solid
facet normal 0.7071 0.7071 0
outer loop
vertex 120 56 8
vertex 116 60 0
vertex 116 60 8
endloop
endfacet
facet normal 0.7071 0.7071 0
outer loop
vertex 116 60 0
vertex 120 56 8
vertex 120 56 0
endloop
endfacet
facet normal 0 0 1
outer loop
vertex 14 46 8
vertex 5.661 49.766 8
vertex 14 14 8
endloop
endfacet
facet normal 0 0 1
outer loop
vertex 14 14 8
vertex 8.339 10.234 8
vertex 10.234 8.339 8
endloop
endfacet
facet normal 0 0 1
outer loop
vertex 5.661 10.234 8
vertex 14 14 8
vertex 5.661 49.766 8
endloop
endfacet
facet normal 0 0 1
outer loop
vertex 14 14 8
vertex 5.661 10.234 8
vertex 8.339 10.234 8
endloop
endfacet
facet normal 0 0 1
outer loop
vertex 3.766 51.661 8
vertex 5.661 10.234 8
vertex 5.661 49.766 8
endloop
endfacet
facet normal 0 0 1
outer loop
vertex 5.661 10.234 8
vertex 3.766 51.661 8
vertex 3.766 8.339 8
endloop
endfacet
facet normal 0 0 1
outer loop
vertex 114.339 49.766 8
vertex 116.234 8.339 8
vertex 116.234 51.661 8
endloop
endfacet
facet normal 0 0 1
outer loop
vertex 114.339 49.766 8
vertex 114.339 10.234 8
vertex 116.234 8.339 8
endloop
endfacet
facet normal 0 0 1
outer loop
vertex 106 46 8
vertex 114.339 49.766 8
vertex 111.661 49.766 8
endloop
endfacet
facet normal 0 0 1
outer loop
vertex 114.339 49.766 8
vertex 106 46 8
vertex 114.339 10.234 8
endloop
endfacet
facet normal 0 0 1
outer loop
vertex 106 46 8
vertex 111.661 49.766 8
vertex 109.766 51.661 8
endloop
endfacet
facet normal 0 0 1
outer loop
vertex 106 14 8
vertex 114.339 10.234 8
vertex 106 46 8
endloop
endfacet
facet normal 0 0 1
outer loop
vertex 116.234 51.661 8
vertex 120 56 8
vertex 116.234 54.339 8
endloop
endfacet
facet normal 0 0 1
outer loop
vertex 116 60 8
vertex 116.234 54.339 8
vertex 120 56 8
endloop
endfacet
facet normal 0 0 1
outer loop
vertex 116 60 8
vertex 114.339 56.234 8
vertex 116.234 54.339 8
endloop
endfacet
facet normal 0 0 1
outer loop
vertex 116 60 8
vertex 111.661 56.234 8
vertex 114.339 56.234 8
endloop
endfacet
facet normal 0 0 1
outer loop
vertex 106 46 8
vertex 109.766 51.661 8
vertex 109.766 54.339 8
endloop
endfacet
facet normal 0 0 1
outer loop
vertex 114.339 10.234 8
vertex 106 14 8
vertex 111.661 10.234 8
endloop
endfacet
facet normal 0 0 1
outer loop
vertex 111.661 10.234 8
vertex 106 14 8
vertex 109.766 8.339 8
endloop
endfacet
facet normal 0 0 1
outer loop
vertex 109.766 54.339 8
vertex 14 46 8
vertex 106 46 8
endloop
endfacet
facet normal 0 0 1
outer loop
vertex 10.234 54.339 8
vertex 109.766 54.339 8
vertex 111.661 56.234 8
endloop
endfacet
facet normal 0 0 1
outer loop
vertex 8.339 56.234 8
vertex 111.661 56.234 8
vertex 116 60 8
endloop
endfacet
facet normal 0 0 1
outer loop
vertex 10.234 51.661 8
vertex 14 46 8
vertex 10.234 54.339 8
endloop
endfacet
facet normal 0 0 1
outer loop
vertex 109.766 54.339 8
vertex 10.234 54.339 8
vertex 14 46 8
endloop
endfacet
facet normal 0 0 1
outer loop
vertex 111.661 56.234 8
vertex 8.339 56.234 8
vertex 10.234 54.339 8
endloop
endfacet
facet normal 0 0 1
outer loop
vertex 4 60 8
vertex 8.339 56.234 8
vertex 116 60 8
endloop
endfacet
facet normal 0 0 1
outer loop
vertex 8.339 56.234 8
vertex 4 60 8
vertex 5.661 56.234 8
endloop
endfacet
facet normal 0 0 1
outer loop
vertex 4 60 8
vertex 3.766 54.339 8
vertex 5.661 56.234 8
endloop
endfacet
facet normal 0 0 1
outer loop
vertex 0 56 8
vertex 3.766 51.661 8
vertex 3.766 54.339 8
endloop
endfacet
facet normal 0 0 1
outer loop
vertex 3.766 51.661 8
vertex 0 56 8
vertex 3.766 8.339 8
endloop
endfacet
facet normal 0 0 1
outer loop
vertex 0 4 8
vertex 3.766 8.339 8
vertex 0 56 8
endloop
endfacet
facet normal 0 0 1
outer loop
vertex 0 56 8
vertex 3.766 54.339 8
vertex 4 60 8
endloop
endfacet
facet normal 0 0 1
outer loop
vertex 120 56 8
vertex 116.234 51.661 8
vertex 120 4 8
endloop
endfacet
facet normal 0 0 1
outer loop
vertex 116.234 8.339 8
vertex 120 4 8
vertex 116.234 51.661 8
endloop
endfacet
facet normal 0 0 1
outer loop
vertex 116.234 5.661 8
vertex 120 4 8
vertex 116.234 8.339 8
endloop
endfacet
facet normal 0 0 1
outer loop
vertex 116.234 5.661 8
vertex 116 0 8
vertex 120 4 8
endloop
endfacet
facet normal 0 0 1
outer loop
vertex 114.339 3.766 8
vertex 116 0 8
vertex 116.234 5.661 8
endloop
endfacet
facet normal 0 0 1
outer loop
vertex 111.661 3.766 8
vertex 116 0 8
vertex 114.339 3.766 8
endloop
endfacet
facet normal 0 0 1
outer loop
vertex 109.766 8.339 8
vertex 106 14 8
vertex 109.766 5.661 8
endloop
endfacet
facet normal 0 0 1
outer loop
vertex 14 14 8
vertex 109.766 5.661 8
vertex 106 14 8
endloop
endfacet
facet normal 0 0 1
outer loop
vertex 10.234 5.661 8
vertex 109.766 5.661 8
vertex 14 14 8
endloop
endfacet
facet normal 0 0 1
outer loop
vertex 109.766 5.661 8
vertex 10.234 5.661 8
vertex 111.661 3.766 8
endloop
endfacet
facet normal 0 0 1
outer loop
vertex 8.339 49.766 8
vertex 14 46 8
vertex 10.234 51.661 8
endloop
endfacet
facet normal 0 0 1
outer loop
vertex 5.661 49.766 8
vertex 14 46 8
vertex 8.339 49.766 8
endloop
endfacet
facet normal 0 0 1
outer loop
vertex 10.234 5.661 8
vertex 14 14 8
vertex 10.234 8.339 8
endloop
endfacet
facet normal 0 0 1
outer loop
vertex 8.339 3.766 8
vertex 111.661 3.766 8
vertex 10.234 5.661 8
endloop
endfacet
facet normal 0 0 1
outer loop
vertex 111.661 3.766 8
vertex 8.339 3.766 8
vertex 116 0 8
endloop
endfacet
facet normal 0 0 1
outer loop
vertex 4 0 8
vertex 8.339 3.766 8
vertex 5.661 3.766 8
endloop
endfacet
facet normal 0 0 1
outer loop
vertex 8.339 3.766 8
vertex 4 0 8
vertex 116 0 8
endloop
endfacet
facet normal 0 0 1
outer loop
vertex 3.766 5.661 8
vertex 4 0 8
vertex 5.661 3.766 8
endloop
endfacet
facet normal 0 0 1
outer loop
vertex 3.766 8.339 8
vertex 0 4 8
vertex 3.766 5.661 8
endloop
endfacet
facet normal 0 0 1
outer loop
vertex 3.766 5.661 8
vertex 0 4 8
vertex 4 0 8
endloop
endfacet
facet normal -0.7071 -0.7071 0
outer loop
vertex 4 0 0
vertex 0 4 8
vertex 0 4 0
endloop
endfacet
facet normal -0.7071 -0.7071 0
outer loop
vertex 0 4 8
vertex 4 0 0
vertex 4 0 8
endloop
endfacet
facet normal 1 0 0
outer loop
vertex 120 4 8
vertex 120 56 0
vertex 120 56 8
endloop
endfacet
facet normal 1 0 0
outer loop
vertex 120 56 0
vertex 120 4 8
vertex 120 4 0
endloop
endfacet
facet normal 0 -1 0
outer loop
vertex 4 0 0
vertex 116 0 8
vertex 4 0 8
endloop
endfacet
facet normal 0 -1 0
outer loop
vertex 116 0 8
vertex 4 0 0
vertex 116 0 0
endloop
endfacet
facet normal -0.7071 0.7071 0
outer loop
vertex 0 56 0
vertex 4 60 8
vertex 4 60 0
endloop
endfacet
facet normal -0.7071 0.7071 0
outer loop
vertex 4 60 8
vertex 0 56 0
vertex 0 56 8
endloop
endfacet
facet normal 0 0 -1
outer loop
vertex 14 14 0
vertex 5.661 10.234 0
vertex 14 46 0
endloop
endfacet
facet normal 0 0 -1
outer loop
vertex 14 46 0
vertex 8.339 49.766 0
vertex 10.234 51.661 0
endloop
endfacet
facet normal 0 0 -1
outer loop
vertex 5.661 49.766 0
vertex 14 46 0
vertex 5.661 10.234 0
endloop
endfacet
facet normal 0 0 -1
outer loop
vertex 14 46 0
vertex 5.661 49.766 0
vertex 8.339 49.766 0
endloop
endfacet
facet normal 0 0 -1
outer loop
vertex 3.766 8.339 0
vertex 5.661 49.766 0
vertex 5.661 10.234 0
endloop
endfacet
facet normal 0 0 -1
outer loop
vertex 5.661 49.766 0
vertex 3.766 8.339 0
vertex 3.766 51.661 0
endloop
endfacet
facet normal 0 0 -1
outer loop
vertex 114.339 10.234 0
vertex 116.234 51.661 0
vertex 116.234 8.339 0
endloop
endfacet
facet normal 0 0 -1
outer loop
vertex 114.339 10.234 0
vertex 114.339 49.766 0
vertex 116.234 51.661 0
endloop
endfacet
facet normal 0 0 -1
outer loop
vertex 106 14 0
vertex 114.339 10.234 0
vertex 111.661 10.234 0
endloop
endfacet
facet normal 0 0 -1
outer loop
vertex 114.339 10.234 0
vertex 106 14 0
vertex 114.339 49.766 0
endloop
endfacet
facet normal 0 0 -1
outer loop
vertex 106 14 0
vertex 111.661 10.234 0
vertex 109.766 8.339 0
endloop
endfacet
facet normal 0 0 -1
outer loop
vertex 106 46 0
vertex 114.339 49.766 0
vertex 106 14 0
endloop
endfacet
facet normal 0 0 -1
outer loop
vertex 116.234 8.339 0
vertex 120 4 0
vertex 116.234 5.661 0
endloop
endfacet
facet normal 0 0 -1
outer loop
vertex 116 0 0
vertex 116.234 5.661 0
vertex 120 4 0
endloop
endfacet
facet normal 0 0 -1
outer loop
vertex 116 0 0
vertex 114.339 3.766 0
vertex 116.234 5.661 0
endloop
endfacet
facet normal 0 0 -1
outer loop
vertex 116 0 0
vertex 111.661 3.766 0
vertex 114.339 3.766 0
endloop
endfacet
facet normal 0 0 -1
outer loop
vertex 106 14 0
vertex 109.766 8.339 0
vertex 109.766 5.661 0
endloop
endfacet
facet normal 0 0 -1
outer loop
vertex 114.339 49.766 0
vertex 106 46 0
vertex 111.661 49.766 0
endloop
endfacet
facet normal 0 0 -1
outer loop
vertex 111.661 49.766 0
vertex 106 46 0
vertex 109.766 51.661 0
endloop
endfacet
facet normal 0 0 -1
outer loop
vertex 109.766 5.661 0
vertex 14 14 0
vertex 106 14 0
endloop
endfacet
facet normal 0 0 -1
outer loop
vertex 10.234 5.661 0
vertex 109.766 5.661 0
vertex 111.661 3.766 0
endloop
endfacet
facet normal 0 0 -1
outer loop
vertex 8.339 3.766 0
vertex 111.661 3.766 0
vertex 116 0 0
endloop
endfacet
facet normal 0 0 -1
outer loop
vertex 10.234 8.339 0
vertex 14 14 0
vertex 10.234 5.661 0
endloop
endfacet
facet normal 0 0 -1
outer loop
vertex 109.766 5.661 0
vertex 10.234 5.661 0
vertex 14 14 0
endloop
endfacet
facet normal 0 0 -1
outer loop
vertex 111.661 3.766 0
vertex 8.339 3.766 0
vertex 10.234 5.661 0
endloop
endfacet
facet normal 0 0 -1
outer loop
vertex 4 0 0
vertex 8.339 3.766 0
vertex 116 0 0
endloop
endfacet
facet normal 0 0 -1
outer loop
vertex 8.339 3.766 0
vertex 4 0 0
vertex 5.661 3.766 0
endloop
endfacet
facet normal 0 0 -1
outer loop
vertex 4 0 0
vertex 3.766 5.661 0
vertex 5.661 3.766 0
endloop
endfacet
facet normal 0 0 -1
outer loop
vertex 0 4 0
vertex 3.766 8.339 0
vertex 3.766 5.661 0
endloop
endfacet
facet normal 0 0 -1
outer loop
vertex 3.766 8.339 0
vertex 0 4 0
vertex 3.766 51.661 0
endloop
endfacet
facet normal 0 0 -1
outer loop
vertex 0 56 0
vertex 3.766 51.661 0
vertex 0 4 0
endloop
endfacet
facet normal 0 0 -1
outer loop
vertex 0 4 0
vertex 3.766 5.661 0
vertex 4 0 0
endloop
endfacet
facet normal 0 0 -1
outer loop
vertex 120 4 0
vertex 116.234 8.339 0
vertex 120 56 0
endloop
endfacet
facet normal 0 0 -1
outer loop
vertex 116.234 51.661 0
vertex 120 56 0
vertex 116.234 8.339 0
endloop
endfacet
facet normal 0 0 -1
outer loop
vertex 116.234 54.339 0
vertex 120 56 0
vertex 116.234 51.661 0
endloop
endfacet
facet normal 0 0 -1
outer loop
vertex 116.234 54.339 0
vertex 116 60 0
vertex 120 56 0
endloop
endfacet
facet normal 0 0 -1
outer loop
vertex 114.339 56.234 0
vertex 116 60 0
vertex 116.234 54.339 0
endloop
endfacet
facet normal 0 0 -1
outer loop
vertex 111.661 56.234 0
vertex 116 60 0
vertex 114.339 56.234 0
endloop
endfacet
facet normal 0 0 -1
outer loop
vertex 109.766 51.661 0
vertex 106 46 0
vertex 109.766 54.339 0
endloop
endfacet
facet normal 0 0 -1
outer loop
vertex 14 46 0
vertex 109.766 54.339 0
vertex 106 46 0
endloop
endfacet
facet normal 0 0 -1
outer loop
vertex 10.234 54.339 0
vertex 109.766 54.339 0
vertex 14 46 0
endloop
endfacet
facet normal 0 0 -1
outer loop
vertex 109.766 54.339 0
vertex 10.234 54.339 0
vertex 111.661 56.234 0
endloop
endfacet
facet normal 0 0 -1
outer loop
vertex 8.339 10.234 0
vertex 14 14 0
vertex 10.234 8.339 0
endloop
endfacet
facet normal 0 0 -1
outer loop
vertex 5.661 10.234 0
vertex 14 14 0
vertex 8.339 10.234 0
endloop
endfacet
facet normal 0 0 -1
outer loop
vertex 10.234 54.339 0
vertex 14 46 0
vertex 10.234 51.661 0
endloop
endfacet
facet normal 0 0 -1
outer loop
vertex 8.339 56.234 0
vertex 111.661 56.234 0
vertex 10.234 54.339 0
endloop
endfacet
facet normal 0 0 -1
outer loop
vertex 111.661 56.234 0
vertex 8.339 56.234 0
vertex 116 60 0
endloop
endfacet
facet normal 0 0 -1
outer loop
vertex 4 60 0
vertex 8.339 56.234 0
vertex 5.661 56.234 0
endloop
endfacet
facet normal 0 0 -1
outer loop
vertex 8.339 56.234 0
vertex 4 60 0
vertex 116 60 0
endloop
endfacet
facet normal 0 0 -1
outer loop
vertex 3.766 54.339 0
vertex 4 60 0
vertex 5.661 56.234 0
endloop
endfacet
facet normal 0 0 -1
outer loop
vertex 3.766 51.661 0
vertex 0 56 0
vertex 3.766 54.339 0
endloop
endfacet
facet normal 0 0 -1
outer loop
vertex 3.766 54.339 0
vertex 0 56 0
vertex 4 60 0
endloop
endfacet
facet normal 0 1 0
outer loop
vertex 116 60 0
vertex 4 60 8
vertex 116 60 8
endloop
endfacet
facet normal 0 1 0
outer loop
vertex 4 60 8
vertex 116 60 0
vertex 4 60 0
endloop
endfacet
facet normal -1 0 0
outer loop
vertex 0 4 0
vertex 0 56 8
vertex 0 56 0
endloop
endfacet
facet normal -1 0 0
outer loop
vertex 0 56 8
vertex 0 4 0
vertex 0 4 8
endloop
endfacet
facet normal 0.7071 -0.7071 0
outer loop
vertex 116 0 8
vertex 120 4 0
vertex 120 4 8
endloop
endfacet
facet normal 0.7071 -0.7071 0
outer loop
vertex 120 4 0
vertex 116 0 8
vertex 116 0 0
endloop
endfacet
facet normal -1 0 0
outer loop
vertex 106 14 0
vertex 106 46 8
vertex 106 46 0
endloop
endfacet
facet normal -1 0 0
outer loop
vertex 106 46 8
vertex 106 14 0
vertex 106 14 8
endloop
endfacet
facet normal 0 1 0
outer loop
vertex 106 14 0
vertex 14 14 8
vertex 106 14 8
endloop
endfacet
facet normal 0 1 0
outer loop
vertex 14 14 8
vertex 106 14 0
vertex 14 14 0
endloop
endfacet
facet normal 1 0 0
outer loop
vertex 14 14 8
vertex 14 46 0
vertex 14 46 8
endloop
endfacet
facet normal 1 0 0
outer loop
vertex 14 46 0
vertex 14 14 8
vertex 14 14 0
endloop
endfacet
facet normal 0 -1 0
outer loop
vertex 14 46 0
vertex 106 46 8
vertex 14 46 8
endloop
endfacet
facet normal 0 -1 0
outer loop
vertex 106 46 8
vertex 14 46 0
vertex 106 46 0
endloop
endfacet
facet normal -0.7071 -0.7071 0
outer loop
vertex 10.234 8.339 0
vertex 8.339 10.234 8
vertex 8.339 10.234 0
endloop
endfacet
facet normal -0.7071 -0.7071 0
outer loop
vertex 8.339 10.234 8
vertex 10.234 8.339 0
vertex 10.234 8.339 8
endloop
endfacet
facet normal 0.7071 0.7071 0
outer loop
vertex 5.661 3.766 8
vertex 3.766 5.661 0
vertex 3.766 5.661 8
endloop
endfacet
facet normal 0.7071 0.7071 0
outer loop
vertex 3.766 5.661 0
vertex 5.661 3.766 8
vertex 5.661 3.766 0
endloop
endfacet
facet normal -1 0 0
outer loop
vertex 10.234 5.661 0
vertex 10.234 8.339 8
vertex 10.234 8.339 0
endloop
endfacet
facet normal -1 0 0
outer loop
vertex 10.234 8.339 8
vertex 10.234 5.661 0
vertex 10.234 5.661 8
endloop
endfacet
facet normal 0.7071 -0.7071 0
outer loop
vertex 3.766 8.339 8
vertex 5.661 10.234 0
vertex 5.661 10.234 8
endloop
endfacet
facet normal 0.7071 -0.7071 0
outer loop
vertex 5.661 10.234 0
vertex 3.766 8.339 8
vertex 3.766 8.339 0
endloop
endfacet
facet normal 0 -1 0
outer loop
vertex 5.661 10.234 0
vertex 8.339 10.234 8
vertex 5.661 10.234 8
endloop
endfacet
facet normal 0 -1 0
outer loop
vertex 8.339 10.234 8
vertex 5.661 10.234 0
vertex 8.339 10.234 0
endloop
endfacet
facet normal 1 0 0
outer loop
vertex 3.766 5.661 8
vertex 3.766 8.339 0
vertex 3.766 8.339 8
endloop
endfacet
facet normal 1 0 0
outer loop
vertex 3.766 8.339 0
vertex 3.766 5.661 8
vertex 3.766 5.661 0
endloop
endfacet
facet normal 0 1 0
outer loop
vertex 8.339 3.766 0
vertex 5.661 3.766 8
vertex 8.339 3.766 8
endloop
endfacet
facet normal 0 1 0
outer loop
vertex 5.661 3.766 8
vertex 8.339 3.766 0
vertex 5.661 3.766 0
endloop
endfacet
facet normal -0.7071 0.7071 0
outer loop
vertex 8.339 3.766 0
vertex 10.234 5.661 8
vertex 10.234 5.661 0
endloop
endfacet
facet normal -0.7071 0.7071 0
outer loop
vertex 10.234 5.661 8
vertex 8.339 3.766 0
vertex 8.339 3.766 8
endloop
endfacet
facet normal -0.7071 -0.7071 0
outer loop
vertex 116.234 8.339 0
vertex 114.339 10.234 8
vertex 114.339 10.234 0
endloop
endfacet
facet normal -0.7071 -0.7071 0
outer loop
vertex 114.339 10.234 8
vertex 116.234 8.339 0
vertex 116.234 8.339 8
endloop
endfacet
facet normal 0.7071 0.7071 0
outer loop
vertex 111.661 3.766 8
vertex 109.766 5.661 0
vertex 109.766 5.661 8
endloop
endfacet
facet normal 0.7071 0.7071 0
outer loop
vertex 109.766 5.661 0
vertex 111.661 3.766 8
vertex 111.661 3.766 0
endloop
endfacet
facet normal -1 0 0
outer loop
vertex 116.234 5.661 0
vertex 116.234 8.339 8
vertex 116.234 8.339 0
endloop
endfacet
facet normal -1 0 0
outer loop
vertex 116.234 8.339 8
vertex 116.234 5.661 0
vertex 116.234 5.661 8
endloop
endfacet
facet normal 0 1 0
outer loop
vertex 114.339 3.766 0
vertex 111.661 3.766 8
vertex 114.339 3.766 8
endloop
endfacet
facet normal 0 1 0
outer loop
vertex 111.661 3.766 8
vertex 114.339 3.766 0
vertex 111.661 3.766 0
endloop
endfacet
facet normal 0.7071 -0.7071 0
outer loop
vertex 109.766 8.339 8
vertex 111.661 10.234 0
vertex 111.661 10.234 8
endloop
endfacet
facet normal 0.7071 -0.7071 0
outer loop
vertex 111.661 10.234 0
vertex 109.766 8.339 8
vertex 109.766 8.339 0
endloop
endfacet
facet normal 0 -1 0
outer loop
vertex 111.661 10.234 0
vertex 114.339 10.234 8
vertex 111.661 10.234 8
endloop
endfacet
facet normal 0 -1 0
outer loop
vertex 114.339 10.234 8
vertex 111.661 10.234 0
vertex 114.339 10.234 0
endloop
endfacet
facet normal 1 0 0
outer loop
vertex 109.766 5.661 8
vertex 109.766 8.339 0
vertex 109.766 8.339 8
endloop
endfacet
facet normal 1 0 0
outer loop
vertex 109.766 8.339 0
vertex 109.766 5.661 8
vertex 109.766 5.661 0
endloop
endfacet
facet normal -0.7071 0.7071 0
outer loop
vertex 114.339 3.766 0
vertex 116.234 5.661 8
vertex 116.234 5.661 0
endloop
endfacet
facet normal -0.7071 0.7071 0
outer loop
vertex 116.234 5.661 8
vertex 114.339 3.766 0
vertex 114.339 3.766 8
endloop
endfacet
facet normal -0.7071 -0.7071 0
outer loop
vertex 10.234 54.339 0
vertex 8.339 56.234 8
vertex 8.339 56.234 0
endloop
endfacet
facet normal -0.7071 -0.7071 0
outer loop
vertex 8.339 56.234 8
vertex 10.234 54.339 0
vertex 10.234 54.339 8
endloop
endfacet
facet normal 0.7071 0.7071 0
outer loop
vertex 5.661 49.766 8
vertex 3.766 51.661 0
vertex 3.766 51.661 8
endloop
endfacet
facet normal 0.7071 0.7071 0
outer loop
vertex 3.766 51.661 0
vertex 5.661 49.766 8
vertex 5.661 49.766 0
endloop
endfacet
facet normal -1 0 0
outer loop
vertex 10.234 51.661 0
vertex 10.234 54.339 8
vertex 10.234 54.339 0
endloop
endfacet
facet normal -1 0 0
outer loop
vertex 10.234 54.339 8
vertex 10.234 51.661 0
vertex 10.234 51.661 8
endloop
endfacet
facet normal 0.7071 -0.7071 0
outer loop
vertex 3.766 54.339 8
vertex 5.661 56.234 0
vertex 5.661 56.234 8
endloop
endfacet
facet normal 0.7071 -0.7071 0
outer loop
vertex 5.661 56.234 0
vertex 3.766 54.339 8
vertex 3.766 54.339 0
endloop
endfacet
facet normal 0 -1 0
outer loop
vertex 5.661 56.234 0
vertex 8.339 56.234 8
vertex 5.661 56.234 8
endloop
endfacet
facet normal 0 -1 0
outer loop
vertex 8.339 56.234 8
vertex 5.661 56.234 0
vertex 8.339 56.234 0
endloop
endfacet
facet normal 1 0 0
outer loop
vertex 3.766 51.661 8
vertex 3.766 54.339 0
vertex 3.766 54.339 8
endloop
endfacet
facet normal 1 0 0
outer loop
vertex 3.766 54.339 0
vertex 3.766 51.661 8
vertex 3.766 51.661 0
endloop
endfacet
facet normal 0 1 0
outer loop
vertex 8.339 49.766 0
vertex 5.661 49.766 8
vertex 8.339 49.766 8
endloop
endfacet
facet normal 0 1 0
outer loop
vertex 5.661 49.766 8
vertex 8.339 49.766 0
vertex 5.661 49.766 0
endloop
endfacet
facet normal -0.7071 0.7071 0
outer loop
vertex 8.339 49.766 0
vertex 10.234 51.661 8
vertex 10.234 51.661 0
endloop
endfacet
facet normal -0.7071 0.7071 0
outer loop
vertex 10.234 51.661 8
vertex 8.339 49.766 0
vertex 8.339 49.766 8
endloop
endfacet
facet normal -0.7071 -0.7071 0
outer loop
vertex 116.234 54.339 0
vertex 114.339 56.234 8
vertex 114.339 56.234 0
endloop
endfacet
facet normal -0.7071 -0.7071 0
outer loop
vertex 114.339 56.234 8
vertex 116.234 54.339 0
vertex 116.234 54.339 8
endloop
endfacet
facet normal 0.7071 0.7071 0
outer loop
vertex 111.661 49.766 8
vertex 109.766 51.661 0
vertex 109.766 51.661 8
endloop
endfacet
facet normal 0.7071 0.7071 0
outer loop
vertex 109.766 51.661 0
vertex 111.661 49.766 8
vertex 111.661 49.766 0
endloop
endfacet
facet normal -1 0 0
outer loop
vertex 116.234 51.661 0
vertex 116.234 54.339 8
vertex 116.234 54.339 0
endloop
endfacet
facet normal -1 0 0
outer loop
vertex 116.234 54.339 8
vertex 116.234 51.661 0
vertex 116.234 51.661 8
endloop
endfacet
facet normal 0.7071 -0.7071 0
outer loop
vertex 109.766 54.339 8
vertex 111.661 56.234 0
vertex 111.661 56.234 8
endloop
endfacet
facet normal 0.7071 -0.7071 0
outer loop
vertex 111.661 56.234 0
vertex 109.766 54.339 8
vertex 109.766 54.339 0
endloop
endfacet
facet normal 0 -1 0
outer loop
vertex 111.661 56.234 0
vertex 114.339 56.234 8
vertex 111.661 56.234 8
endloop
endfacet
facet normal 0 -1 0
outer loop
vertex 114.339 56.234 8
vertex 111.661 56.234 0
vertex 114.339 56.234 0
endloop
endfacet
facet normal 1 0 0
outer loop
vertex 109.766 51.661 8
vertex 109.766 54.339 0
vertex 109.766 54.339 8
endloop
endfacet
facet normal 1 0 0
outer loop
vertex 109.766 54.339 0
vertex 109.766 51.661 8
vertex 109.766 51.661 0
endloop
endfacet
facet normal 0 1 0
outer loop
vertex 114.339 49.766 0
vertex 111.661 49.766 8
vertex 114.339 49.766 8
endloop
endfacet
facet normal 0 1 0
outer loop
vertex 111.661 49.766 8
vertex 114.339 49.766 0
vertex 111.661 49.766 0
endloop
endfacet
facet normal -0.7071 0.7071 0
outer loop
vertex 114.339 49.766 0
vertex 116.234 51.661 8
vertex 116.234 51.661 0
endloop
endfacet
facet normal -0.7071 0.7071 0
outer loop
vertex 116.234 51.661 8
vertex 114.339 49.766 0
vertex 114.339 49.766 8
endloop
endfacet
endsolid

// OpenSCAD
$fn = 32;

// ----------------------------------------------------------------------
// Frame plate: 120 x 60 frame, 14 mm rails
// ----------------------------------------------------------------------

// --- parameters (mm) ---
plate_l = 120;            // plate length, X
plate_w = 60;             // plate width, Y
plate_t = 8;              // plate thickness, Z (extrusion height)
corner_c = 4;             // corner chamfer
frame_bar = 14;           // frame rail width
bolt_r = 3.5;             // corner bolt window radius
bolt_inset = 7;           // bolt centre inset from the edges

win_l = plate_l - 2 * frame_bar;  // window length
win_w = plate_w - 2 * frame_bar;  // window width
bolt_d = 2 * bolt_r;  // corner hole diameter

profile = [[4, 0], [116, 0], [120, 4], [120, 56], [116, 60], [4, 60], [0, 56], [0, 4]];  // primary outline, 8 points, counter clockwise
void_1 = [[14, 14], [106, 14], [106, 46], [14, 46]];  // the window, 4 points
void_2 = [[10.234, 8.339], [8.339, 10.234], [5.661, 10.234], [3.766, 8.339], [3.766, 5.661], [5.661, 3.766], [8.339, 3.766], [10.234, 5.661]];  // corner bolt window, 8 points
void_3 = [[116.234, 8.339], [114.339, 10.234], [111.661, 10.234], [109.766, 8.339], [109.766, 5.661], [111.661, 3.766], [114.339, 3.766], [116.234, 5.661]];  // corner bolt window, 8 points
void_4 = [[10.234, 54.339], [8.339, 56.234], [5.661, 56.234], [3.766, 54.339], [3.766, 51.661], [5.661, 49.766], [8.339, 49.766], [10.234, 51.661]];  // corner bolt window, 8 points
void_5 = [[116.234, 54.339], [114.339, 56.234], [111.661, 56.234], [109.766, 54.339], [109.766, 51.661], [111.661, 49.766], [114.339, 49.766], [116.234, 51.661]];  // corner bolt window, 8 points

// --- the one profile operation ---
difference() {
  linear_extrude(height = plate_t) polygon(points = profile);
  translate([0, 0, -1])
    linear_extrude(height = plate_t + 2) polygon(points = void_1);
  translate([0, 0, -1])
    linear_extrude(height = plate_t + 2) polygon(points = void_2);
  translate([0, 0, -1])
    linear_extrude(height = plate_t + 2) polygon(points = void_3);
  translate([0, 0, -1])
    linear_extrude(height = plate_t + 2) polygon(points = void_4);
  translate([0, 0, -1])
    linear_extrude(height = plate_t + 2) polygon(points = void_5);
}
